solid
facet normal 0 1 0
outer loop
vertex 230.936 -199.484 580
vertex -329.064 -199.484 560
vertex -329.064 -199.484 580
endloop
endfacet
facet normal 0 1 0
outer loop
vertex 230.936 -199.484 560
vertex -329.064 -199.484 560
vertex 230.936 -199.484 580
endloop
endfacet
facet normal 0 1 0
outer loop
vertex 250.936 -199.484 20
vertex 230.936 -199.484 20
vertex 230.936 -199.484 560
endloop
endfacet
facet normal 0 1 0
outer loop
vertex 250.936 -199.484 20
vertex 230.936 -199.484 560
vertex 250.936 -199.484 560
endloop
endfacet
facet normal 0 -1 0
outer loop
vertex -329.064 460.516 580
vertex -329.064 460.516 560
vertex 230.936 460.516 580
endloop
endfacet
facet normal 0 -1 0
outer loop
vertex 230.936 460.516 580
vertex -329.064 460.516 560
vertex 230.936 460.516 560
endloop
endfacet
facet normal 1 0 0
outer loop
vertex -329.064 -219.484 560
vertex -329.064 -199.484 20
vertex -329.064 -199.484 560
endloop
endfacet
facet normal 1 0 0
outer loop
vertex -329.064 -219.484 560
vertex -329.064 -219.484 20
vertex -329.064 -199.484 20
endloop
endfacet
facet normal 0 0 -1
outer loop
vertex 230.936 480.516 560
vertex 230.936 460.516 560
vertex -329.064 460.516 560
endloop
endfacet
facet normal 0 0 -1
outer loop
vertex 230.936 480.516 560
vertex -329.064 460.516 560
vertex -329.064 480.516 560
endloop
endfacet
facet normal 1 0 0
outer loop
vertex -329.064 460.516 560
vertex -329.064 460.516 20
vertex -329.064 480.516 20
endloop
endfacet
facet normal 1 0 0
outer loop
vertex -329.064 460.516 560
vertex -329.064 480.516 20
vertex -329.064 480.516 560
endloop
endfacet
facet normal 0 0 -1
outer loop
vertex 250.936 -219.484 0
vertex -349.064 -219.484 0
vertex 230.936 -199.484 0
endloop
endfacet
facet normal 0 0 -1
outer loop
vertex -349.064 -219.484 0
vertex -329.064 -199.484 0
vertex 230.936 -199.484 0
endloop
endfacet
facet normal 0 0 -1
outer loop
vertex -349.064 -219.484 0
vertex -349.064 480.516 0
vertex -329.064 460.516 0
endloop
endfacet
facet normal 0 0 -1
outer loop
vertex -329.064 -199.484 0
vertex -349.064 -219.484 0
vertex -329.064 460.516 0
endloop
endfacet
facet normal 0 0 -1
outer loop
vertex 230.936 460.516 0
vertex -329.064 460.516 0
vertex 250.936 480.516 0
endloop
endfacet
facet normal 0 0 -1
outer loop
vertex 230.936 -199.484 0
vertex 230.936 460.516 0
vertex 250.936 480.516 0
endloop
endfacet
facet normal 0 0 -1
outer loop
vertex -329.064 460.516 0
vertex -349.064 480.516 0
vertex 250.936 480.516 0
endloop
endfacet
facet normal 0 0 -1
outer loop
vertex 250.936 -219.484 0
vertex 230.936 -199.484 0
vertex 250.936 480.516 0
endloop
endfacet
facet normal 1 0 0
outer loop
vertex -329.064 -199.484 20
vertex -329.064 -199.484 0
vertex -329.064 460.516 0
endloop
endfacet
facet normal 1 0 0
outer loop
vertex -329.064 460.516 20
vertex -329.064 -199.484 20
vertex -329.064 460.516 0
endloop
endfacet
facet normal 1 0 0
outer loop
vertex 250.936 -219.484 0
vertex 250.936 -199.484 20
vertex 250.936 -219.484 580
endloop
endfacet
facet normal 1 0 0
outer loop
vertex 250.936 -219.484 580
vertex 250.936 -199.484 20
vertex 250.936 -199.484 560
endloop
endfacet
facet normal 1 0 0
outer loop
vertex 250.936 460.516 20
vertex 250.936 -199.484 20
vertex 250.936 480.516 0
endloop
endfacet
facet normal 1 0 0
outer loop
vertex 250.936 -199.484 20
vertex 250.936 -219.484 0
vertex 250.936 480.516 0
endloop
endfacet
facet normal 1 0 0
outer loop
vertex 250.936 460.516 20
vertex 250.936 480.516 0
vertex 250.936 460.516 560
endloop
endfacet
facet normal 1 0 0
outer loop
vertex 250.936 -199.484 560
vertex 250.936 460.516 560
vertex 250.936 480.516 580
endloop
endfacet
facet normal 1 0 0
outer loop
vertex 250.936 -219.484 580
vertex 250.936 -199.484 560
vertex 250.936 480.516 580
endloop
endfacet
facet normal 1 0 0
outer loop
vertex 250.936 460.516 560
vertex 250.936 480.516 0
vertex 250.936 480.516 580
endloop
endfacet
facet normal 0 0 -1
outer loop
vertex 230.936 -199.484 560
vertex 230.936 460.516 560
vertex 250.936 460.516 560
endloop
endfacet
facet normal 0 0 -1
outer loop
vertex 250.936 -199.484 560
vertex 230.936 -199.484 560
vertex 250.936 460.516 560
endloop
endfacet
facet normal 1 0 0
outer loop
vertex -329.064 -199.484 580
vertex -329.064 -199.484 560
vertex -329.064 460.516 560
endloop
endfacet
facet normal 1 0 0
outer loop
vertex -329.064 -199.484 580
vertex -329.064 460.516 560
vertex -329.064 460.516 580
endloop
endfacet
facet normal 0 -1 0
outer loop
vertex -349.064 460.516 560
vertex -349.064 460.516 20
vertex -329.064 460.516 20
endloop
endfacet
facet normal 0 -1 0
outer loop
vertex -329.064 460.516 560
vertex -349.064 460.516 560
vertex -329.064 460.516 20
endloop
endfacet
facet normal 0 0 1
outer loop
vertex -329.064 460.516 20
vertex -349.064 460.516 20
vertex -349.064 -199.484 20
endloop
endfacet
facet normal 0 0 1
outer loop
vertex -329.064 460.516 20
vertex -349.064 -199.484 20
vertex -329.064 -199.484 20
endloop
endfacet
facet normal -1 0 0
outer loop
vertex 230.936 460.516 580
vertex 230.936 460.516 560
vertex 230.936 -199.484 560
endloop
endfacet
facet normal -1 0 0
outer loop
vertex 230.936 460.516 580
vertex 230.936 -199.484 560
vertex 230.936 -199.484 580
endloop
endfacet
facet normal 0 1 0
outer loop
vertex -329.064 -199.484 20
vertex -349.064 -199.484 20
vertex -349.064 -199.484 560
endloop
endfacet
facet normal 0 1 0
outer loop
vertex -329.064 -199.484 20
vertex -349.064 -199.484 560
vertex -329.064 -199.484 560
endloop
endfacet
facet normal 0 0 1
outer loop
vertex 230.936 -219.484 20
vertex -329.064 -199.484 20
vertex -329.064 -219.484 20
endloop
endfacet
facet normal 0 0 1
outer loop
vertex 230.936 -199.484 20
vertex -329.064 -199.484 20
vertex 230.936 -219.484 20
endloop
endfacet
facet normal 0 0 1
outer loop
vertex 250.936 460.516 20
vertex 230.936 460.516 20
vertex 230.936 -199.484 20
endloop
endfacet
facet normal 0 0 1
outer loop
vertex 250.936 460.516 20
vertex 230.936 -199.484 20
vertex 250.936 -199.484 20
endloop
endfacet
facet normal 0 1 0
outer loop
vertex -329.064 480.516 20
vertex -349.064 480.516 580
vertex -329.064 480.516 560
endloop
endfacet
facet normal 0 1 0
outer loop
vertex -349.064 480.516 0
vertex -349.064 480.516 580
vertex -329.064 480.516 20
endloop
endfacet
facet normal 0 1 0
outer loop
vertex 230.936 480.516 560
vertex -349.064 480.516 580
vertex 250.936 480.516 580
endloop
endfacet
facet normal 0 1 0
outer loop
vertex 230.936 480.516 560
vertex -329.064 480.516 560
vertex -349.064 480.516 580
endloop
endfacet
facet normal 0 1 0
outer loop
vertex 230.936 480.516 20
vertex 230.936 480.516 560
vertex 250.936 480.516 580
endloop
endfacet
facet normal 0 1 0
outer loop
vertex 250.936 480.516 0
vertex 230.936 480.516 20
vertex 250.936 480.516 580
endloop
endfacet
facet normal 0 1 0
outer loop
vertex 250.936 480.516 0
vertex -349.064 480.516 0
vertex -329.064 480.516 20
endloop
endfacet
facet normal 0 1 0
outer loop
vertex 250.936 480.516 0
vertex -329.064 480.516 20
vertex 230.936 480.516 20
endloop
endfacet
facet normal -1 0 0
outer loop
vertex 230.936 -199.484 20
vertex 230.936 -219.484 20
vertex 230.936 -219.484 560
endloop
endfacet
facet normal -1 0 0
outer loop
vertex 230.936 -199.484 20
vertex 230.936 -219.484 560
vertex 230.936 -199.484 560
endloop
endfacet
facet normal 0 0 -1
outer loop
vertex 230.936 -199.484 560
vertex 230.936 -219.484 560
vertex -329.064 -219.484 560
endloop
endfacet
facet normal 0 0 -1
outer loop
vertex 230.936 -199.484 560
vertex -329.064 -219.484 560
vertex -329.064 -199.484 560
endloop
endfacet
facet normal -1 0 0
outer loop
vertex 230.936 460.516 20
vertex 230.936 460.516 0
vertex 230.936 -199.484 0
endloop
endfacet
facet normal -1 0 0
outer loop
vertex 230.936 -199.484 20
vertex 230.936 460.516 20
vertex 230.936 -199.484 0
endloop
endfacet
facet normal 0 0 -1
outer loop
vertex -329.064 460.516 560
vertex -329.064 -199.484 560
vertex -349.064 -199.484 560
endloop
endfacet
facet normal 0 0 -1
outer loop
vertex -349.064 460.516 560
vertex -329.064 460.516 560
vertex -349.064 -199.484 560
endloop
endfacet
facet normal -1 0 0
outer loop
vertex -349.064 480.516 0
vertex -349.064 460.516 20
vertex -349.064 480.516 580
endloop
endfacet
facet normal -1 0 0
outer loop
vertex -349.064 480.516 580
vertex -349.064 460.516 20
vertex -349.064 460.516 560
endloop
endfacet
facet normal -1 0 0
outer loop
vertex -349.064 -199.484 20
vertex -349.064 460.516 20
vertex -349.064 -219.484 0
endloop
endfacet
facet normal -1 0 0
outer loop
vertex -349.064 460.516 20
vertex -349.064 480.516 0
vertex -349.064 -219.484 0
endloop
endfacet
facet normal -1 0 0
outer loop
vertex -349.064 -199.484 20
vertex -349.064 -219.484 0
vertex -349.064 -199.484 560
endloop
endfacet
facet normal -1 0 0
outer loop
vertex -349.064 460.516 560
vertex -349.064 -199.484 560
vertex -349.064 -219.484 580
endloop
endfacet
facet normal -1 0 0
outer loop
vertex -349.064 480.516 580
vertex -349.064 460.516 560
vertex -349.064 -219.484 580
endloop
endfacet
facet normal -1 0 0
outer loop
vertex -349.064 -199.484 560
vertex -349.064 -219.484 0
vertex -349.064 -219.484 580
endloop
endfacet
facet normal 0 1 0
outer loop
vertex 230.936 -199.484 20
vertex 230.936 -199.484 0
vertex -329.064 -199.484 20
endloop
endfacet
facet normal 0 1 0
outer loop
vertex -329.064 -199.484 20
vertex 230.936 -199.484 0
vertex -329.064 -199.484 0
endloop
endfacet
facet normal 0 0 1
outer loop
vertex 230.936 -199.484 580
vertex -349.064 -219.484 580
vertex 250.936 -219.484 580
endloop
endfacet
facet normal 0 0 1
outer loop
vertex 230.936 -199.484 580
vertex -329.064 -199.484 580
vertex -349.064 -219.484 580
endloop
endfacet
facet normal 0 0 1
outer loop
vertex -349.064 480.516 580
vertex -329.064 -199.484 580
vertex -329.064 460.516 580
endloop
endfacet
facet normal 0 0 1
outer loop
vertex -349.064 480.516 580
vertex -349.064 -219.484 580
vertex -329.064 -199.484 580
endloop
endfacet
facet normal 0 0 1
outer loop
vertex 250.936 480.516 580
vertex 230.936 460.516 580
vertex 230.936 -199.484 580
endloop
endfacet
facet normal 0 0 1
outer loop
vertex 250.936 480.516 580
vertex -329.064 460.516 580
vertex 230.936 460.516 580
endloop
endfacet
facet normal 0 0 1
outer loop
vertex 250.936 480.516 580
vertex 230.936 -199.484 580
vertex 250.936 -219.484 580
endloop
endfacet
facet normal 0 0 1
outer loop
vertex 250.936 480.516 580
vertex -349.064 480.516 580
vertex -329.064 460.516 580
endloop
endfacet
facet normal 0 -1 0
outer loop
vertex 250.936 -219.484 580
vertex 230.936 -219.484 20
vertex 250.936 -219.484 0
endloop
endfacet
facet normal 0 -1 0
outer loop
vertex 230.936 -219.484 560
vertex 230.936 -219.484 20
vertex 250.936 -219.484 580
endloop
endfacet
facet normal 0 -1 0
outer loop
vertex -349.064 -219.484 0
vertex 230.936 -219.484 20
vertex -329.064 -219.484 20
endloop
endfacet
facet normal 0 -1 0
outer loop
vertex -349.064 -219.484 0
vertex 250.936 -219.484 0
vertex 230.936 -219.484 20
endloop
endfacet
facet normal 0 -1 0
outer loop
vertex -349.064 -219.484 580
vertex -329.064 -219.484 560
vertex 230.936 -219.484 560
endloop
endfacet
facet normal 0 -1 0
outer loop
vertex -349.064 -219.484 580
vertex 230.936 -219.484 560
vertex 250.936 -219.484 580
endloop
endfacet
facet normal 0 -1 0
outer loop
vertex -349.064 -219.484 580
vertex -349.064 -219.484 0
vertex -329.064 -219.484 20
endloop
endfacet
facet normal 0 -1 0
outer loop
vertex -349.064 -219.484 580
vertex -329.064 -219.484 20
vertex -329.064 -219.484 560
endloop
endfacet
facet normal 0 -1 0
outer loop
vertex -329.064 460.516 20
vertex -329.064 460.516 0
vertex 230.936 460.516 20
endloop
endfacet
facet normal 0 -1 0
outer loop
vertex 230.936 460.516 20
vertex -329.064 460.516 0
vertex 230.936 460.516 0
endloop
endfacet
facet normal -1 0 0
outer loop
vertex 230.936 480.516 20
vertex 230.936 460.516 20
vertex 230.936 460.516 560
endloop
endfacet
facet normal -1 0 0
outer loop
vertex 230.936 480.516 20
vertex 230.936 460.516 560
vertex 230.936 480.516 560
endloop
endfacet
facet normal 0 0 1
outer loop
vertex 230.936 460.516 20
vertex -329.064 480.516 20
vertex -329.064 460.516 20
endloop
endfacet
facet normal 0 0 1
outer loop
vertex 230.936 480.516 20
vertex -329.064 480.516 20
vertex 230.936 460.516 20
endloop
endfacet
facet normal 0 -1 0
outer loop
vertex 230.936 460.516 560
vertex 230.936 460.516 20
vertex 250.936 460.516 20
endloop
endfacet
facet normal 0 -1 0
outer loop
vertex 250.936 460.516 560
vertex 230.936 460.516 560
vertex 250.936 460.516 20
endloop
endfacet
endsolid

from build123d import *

# Parameters (mm, degrees)
F0_W      = 20
F0_H      = 660
F0_H_2    = 20
F1_DEPTH  = 20
F2_DEPTH  = 580
F3_W      = 20
F3_H      = 20
F4_DEPTH  = 660
F5_W      = 20
F5_H      = 20
F6_DEPTH  = 560
F7_W      = 20
F7_H      = 20
F8_DEPTH  = 560
F9_W      = 20
F9_H      = 20
F10_DEPTH = 660


# Not quite as in the source:
# - a feature names something its author has since deleted; it is built from what else it names


with BuildPart() as f1:
    # F0 (on Top) → F1 (new body)
    with BuildSketch(Plane.XY):
        Polygon((250.936165452, 480.5163520575), (-329.063834548, 480.5163520575), (-329.063834548, 460.5163520575), (230.936165452, 460.5163520575), (230.936165452, -199.4836479425), (-329.063834548, -199.4836479425), (-329.063834548, -219.4836479425), (250.936165452, -219.4836479425), align=None)
        with Locations((-339.063834548, 130.5163520575)):
            Rectangle(F0_W, F0_H)
        with Locations((-339.063834548, 470.5163520575)):
            Rectangle(F0_W, F0_H_2)
        with Locations((-339.063834548, -209.4836479425)):
            Rectangle(F0_W, F0_H_2)
    extrude(amount=F1_DEPTH)

    # F0 (on Top) → F2 (join)
    with BuildSketch(Plane.XY):
        with Locations((-339.063834548, 470.5163520575)):
            Rectangle(F0_W, F0_H_2)
        with Locations((-339.063834548, -209.4836479425)):
            Rectangle(F0_W, F0_H_2)
    extrude(amount=F2_DEPTH)

    # F3 (on face) → F4 (join)
    with BuildSketch(Plane(origin=(0, -199.4836479425, 0), x_dir=(-1, 0, 0), z_dir=(0, 1, 0))):
        with Locations((339.063834548, 570)):
            Rectangle(F3_W, F3_H)
    extrude(amount=F4_DEPTH)

    # F5 (on face) → F6 (join)
    with BuildSketch(Plane.YZ.offset(-329.063834548)):
        with Locations((-209.4836479425, 570)):
            Rectangle(F5_W, F5_H)
        with Locations((470.5163520575, 570)):
            Rectangle(F5_W, F5_H)
    extrude(amount=F6_DEPTH)

    # F7 (on face) → F8 (join)
    with BuildSketch(Plane.XY.offset(20)):
        with Locations((240.936165452, 470.5163520575)):
            Rectangle(F7_W, F7_H)
        with Locations((240.936165452, -209.4836479425)):
            Rectangle(F7_W, F7_H)
    extrude(amount=F8_DEPTH)

    # F9 (on face) → F10 (join)
    with BuildSketch(Plane.XZ.offset(-460.5163520575)):
        with Locations((240.936165452, 570)):
            Rectangle(F9_W, F9_H)
    extrude(amount=F10_DEPTH)


solid = f1.part
